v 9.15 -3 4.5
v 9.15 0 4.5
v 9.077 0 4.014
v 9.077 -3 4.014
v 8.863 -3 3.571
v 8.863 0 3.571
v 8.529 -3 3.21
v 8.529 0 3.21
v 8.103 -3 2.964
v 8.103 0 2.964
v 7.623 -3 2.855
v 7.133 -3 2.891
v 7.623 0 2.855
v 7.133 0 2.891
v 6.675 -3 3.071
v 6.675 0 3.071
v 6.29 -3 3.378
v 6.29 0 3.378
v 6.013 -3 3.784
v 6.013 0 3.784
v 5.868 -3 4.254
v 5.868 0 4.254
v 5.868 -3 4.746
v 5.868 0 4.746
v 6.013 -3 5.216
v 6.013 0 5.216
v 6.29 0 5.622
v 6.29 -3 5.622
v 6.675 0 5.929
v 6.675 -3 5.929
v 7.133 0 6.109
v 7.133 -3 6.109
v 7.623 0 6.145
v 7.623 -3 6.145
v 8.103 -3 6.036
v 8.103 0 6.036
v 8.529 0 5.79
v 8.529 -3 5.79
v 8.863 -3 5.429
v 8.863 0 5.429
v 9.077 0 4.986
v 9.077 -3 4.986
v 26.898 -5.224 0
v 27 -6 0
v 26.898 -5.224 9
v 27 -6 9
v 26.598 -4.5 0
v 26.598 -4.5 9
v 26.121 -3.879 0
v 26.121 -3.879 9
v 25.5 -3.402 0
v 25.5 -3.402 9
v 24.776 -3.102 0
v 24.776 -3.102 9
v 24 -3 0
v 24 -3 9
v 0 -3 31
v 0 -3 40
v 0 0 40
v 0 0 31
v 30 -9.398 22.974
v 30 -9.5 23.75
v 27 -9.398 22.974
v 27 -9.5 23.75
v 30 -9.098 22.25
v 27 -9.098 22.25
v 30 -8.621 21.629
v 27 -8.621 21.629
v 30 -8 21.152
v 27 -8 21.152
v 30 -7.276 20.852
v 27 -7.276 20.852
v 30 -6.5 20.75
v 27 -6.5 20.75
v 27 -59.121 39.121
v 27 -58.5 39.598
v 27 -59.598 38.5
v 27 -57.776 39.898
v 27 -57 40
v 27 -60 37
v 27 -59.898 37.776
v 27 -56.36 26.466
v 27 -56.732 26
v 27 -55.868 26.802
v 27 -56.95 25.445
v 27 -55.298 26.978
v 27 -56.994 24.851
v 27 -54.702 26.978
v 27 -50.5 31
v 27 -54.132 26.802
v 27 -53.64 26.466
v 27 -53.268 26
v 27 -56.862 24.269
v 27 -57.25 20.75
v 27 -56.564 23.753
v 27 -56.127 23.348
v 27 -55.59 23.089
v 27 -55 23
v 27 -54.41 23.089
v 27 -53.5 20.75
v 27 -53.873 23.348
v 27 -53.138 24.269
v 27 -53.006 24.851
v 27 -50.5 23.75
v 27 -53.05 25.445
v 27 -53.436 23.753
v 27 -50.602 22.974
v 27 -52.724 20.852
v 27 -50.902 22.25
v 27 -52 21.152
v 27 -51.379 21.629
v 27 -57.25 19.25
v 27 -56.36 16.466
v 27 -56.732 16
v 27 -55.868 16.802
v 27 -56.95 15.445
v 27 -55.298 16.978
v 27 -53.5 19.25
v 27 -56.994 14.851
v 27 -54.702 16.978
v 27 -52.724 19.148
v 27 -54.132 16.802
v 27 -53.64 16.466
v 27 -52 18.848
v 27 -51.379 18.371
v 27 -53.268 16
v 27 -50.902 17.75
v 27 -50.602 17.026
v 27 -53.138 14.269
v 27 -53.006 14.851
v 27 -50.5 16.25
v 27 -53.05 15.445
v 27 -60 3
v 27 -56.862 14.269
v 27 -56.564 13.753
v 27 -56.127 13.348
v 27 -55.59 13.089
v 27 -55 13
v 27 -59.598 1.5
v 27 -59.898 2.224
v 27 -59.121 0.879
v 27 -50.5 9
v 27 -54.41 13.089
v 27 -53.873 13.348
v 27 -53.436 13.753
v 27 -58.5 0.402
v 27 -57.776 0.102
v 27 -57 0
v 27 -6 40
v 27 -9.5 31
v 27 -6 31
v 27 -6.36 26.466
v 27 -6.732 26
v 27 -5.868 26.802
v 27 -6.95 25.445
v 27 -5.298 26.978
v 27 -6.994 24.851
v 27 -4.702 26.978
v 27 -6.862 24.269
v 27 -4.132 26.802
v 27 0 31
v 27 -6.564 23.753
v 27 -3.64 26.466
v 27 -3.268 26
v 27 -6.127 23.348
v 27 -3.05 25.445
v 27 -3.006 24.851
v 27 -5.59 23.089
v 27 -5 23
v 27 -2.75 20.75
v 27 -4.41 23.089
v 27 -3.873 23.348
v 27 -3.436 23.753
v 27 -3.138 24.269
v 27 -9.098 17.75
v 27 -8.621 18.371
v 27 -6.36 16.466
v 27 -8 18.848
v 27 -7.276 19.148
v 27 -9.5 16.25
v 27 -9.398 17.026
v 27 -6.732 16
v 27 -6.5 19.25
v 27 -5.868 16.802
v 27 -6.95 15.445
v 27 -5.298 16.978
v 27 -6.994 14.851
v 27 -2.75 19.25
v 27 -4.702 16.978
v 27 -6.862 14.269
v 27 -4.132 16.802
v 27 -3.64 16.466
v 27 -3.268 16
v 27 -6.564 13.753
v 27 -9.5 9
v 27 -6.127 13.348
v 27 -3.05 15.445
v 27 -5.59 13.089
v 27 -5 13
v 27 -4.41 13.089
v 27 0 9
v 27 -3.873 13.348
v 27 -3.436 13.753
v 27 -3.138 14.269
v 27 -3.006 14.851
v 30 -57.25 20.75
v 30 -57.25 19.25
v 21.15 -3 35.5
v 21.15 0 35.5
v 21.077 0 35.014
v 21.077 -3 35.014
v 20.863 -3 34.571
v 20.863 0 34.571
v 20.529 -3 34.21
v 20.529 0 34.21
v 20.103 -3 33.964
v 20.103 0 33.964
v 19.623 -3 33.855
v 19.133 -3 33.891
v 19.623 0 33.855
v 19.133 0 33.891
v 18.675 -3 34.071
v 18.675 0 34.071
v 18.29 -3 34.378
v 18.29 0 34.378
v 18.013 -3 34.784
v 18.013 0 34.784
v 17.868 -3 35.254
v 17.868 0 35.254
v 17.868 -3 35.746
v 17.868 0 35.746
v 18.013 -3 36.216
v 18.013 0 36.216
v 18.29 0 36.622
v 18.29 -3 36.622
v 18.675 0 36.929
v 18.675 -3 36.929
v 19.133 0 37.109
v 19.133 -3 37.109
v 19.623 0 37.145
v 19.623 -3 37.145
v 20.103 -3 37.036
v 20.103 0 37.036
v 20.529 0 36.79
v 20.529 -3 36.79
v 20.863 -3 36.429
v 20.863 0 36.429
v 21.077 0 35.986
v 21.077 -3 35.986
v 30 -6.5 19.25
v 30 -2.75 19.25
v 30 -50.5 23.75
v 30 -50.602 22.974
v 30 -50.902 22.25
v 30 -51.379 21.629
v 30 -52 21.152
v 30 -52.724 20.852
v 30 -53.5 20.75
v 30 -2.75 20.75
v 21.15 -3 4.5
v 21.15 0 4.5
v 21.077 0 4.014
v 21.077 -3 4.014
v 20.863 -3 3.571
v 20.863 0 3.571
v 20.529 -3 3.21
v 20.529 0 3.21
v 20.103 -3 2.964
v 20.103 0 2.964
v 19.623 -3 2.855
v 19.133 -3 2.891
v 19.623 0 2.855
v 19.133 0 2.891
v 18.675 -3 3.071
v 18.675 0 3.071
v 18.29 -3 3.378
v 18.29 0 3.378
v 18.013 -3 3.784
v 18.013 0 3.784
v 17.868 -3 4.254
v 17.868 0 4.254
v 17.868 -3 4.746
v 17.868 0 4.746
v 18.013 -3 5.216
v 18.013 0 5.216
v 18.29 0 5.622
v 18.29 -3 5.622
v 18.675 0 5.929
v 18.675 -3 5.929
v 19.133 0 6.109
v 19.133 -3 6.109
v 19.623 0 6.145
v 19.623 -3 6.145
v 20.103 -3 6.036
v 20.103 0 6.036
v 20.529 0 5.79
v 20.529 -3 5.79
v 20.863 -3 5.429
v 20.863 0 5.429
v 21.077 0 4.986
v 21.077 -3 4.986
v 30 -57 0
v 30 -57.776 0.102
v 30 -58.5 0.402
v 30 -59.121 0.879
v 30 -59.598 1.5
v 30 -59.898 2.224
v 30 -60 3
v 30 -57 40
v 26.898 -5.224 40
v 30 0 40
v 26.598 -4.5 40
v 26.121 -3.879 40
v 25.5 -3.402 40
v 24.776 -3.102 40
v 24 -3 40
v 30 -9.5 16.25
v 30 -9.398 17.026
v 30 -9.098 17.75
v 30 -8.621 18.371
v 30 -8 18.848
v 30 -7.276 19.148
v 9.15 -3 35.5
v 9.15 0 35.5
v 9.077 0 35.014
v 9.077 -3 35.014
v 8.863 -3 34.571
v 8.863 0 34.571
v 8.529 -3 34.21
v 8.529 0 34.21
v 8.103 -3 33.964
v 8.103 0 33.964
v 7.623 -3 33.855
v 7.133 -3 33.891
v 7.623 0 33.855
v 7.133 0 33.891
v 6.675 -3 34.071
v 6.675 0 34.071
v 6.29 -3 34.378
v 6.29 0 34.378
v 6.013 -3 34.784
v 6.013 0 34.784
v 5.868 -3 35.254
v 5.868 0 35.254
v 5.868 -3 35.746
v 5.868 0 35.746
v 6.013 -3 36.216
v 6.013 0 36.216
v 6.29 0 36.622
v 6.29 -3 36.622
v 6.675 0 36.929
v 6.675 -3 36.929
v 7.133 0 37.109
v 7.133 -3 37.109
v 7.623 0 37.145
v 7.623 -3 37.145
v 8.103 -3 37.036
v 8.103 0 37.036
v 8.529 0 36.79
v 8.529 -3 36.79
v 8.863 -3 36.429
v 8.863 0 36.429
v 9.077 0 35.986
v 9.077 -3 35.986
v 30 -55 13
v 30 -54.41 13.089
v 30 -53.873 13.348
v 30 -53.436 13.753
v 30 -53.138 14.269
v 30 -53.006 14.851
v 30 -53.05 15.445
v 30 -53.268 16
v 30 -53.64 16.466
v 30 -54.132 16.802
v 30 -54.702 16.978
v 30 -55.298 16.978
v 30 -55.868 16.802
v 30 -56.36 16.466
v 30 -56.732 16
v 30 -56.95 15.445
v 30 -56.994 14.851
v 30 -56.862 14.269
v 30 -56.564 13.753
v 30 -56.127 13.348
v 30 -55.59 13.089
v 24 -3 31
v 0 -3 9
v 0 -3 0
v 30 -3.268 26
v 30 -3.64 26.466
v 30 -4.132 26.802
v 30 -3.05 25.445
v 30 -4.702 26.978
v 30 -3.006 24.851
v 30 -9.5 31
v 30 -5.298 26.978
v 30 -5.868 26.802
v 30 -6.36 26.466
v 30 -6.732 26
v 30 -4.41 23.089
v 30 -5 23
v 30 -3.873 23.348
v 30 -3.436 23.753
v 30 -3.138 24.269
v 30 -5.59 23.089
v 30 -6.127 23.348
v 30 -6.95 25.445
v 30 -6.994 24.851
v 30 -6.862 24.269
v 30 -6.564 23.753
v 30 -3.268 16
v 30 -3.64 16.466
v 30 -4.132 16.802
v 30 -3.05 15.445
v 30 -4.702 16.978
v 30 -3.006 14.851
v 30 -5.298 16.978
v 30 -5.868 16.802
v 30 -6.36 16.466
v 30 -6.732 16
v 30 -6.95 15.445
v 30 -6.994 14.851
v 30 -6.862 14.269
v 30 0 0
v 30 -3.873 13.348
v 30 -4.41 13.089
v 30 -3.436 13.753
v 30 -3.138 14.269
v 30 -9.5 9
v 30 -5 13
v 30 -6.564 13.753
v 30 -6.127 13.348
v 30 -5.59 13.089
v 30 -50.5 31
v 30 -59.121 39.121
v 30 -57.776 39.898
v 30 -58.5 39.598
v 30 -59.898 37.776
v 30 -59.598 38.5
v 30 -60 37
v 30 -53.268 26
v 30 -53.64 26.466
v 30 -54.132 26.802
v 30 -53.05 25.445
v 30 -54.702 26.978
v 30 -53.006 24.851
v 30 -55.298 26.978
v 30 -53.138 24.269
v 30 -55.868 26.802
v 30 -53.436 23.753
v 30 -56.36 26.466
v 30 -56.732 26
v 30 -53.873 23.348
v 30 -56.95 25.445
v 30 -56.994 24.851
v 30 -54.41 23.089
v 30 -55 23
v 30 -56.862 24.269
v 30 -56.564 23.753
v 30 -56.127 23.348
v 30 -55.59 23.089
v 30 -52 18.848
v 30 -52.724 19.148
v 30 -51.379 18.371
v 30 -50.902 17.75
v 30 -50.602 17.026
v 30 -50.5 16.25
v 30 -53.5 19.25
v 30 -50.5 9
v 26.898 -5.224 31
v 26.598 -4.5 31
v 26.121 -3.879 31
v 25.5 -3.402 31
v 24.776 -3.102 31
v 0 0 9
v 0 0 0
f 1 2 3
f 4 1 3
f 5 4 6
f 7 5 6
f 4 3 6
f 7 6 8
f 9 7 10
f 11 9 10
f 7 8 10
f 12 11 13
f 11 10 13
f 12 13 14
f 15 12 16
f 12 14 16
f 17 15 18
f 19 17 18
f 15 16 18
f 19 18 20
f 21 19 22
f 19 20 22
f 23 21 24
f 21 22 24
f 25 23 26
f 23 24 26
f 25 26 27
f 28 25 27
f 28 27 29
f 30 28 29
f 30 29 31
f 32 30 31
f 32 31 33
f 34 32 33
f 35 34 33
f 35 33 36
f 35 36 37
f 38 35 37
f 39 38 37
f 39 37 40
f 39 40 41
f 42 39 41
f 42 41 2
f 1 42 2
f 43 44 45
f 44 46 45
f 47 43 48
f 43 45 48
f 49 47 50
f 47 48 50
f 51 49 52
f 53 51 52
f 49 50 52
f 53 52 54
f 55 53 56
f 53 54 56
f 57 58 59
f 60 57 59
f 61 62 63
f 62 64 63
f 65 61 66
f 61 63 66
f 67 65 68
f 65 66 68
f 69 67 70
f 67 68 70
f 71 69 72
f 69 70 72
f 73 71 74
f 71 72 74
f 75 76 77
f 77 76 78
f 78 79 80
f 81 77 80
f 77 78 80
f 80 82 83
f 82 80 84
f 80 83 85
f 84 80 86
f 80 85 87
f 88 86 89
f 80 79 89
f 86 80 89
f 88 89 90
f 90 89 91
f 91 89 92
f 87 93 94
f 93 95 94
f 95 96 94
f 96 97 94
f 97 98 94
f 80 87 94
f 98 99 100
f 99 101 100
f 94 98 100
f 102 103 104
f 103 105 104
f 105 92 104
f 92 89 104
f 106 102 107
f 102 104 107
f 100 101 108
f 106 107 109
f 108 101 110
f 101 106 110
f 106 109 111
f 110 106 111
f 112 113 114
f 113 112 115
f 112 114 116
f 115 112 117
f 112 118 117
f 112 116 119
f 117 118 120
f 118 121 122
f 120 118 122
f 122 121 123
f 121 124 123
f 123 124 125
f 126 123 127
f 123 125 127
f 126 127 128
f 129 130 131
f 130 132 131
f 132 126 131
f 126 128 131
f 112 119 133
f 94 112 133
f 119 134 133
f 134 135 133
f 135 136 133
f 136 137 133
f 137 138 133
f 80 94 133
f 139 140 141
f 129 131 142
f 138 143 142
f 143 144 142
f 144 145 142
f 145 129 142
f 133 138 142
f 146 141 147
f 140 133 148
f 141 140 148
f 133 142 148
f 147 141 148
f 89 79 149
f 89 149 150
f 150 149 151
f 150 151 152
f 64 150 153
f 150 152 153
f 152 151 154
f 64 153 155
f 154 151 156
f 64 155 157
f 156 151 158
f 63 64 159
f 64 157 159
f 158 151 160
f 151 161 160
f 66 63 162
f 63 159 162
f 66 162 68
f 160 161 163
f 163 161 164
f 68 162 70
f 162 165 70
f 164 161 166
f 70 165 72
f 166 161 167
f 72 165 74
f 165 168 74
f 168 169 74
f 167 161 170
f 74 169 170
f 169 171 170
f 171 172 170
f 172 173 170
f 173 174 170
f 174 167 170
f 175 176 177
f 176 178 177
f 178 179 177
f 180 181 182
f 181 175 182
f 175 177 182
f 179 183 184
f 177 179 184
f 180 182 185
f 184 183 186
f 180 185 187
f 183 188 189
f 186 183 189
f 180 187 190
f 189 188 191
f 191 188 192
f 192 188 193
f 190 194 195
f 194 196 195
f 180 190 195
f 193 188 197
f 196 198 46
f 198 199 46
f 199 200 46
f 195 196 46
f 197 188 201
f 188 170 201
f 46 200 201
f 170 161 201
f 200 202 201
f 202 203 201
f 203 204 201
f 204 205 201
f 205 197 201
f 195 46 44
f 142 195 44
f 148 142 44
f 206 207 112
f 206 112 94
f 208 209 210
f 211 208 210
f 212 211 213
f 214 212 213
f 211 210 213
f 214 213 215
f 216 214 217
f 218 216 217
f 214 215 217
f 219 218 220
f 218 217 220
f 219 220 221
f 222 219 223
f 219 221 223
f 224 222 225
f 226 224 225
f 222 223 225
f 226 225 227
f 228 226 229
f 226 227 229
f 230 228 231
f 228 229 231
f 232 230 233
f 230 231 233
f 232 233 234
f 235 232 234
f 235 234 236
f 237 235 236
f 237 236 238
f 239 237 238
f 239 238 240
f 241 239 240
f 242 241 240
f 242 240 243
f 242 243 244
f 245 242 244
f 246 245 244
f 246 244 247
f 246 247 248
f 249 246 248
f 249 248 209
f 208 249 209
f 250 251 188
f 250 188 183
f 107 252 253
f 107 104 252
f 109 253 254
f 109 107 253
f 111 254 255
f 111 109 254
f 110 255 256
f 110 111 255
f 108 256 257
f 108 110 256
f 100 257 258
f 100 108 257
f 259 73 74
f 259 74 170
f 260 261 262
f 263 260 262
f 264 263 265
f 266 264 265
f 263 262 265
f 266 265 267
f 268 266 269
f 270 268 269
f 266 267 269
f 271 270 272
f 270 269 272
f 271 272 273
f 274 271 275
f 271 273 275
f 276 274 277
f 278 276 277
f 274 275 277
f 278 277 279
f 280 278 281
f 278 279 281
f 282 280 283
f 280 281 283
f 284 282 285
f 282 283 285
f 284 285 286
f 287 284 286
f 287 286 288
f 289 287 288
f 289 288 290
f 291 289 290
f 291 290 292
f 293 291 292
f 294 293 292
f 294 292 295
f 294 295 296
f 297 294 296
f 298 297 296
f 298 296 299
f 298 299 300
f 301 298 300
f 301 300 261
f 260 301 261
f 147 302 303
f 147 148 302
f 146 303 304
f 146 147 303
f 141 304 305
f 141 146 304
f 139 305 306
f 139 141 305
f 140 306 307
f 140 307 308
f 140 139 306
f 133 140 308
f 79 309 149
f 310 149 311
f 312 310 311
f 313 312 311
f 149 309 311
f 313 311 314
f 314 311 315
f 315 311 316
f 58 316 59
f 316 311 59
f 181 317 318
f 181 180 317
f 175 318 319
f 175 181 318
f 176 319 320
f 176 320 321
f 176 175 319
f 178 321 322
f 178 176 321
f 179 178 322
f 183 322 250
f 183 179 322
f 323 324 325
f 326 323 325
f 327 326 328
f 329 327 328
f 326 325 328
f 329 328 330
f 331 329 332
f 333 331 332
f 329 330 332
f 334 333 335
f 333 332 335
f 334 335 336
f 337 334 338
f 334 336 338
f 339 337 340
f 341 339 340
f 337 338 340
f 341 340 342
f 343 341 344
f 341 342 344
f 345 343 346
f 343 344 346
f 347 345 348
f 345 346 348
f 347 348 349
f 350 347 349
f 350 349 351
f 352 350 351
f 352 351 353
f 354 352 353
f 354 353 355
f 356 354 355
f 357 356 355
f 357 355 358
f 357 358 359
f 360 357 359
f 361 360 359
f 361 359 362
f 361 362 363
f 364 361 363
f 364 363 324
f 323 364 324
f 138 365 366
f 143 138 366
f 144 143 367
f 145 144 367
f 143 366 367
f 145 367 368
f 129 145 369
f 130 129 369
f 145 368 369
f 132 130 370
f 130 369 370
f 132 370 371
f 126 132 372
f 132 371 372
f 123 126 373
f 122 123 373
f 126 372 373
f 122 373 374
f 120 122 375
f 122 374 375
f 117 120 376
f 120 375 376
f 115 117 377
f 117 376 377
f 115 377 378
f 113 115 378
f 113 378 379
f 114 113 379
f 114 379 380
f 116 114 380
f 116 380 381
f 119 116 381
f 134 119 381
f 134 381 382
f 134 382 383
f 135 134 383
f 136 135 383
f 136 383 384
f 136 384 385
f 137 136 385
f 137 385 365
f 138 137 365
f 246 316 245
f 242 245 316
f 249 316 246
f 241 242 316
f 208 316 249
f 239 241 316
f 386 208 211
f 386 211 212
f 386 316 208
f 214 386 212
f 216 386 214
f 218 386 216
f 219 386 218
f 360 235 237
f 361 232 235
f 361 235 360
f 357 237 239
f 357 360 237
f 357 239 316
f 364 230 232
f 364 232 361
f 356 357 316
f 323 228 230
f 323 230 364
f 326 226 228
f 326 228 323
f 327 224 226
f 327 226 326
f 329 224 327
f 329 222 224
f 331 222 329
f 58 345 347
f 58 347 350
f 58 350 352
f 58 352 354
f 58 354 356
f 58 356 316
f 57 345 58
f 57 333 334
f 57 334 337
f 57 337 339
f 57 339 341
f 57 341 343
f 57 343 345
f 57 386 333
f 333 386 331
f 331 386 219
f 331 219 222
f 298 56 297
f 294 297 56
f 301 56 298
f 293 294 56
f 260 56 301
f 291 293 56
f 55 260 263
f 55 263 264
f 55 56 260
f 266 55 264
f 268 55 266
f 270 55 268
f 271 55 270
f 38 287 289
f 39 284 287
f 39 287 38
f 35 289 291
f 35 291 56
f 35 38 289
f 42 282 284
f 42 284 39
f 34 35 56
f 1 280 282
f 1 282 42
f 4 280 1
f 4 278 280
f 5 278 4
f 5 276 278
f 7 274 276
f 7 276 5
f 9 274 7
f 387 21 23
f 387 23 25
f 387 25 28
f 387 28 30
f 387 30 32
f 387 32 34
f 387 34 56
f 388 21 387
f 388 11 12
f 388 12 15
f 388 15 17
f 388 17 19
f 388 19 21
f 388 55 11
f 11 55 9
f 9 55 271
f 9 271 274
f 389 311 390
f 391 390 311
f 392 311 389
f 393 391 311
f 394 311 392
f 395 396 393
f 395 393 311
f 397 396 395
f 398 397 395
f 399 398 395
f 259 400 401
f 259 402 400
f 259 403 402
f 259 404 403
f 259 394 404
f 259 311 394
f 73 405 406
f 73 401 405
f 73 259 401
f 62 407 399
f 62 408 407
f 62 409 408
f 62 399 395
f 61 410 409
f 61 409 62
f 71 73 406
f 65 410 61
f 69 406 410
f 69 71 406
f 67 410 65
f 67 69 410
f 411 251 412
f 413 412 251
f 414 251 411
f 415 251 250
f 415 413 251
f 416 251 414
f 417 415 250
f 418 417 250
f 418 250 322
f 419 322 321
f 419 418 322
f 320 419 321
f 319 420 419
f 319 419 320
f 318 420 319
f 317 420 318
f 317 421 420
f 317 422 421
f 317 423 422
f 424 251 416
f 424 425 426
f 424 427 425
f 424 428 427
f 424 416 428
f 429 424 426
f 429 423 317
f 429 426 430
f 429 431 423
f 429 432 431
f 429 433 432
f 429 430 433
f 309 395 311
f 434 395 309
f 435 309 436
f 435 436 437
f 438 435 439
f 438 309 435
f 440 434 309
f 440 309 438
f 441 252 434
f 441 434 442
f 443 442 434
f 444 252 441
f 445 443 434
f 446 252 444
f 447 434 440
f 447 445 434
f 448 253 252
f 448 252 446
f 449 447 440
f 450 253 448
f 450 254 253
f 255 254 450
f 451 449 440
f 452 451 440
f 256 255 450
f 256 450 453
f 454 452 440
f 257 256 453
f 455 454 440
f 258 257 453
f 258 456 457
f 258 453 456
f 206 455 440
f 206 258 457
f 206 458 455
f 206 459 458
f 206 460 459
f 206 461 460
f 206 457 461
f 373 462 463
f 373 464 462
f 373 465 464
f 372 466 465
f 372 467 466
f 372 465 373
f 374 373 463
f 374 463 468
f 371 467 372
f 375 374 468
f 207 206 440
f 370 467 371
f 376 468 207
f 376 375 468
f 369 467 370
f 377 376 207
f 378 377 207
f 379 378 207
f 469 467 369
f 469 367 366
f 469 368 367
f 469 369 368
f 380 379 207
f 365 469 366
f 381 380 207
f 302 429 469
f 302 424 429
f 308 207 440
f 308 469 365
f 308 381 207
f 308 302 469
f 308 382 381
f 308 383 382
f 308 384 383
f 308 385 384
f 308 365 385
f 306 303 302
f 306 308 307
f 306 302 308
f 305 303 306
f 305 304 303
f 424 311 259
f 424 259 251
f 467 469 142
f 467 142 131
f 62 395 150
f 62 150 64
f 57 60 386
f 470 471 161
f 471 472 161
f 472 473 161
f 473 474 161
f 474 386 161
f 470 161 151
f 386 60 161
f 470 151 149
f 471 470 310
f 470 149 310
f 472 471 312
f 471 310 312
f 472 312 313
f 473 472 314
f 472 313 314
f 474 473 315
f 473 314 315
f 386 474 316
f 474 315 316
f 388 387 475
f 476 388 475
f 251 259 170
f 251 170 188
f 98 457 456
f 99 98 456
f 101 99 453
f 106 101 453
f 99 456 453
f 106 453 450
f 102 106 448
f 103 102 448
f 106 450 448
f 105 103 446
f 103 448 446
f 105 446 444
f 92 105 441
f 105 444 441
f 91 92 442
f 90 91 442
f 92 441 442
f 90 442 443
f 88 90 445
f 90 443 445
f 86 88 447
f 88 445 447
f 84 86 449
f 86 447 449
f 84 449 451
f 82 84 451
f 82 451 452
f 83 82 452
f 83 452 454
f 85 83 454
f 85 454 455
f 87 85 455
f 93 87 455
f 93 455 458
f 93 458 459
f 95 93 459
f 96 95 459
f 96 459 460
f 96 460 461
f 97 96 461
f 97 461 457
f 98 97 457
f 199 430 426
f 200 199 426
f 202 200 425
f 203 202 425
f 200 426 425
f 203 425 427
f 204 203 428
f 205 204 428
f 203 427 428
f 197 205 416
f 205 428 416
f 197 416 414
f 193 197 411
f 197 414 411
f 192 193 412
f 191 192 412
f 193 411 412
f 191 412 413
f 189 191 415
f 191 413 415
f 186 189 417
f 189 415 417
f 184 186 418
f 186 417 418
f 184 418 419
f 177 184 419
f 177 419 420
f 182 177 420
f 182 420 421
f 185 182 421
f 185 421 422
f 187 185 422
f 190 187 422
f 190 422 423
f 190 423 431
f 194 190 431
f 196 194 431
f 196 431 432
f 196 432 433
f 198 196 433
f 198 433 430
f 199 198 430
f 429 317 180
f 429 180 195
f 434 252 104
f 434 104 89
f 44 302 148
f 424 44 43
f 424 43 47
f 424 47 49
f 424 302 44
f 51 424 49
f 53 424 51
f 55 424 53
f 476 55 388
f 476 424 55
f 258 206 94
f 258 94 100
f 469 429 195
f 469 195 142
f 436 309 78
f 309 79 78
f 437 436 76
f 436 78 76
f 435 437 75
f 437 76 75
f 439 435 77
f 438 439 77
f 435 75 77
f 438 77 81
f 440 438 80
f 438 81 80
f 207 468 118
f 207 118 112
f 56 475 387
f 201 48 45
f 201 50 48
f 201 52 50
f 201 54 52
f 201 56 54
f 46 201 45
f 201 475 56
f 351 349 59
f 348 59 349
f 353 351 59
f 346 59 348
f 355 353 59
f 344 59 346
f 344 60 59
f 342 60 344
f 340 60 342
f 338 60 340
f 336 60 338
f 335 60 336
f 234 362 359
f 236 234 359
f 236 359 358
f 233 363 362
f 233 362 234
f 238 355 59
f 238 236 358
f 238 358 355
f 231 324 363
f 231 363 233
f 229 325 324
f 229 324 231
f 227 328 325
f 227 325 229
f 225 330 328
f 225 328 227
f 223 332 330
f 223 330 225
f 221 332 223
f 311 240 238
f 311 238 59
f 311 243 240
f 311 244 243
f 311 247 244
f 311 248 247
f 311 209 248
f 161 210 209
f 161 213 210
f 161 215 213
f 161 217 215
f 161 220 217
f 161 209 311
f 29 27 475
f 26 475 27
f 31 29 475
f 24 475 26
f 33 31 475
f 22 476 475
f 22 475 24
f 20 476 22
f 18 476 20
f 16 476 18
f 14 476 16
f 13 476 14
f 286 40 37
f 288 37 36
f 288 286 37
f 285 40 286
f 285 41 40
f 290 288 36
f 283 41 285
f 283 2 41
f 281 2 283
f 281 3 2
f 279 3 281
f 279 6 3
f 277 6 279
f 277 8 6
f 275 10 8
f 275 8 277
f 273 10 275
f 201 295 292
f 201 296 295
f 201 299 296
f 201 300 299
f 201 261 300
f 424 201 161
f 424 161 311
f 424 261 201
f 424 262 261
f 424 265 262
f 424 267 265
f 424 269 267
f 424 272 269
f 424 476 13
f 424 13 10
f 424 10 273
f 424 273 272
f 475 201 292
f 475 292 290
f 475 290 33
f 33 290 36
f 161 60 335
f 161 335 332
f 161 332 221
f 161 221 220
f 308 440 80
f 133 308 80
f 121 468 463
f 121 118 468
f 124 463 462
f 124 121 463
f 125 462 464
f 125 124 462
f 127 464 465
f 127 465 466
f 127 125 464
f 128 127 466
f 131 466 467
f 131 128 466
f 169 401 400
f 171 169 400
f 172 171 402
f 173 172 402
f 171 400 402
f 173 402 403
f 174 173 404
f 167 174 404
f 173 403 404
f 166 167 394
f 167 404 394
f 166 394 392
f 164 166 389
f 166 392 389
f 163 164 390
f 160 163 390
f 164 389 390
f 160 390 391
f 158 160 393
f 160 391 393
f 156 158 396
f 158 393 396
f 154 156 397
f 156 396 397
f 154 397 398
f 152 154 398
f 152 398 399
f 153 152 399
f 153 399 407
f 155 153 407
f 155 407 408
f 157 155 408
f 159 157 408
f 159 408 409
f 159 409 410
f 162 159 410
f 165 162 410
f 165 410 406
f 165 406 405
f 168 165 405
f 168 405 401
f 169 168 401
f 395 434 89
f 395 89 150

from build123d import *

# Parameters (mm, degrees)
EXTRUDE_1_DEPTH     = 40
SKETCH_2_R          = 1.65
SKETCH_2_W          = 27
SKETCH_2_H          = 22
CUT_EXTRUDE_2_DEPTH = 10
SKETCH_3_R          = 2
CUT_EXTRUDE_3_DEPTH = 10
FILLET_1_R          = 3


with BuildPart() as part:
    # 草图1 → 凸台-拉伸1 (new body)
    with BuildSketch(Plane.XY):
        Polygon((0, 0), (30, 0), (30, -60), (27, -60), (27, -3), (0, -3), align=None)
    extrude(amount=EXTRUDE_1_DEPTH)

    # 草图2 → 切除-拉伸2 (cut)
    with BuildSketch(Plane(origin=(0, 0, 0), x_dir=(1, 0, 0), z_dir=(0, 1, 0))):
        with Locations((7.5, -4.5)):
            Circle(SKETCH_2_R)
        with Locations((19.5, -4.5)):
            Circle(SKETCH_2_R)
        with Locations((19.5, -35.5)):
            Circle(SKETCH_2_R)
        with Locations((7.5, -35.5)):
            Circle(SKETCH_2_R)
        with Locations((13.5, -20)):
            Rectangle(SKETCH_2_W, SKETCH_2_H)
    extrude(amount=-CUT_EXTRUDE_2_DEPTH, mode=Mode.SUBTRACT)

    # 草图3 → 切除-拉伸3 (cut)
    with BuildSketch(Plane(origin=(30, 0, 0), x_dir=(0, 0, -1), z_dir=(1, 0, 0))):
        with Locations((-25, -5)):
            Circle(SKETCH_3_R)
        with Locations((-15, -5)):
            Circle(SKETCH_3_R)
        with Locations((-15, -55)):
            Circle(SKETCH_3_R)
        with Locations((-25, -55)):
            Circle(SKETCH_3_R)
        Polygon((-20.75, -9.5), (-20.75, -2.75), (-19.25, -2.75), (-19.25, -9.5), (-9, -9.5), (-9, -50.5), (-19.25, -50.5), (-19.25, -57.25), (-20.75, -57.25), (-20.75, -50.5), (-31, -50.5), (-31, -9.5), align=None)
    extrude(amount=-CUT_EXTRUDE_3_DEPTH, mode=Mode.SUBTRACT)

    # 圆角1
    fillet_1_edges = [part.edges().sort_by_distance(p)[0] for p in [
        (27, -3, 35.5),
        (28.5, -60, 40),
        (27, -3, 4.5),
        (28.5, -60, 0),
        (28.5, -9.5, 19.25),
        (28.5, -50.5, 19.25),
        (28.5, -50.5, 20.75),
        (28.5, -9.5, 20.75),
    ]]
    fillet(fillet_1_edges, radius=FILLET_1_R)


solid = part.part
